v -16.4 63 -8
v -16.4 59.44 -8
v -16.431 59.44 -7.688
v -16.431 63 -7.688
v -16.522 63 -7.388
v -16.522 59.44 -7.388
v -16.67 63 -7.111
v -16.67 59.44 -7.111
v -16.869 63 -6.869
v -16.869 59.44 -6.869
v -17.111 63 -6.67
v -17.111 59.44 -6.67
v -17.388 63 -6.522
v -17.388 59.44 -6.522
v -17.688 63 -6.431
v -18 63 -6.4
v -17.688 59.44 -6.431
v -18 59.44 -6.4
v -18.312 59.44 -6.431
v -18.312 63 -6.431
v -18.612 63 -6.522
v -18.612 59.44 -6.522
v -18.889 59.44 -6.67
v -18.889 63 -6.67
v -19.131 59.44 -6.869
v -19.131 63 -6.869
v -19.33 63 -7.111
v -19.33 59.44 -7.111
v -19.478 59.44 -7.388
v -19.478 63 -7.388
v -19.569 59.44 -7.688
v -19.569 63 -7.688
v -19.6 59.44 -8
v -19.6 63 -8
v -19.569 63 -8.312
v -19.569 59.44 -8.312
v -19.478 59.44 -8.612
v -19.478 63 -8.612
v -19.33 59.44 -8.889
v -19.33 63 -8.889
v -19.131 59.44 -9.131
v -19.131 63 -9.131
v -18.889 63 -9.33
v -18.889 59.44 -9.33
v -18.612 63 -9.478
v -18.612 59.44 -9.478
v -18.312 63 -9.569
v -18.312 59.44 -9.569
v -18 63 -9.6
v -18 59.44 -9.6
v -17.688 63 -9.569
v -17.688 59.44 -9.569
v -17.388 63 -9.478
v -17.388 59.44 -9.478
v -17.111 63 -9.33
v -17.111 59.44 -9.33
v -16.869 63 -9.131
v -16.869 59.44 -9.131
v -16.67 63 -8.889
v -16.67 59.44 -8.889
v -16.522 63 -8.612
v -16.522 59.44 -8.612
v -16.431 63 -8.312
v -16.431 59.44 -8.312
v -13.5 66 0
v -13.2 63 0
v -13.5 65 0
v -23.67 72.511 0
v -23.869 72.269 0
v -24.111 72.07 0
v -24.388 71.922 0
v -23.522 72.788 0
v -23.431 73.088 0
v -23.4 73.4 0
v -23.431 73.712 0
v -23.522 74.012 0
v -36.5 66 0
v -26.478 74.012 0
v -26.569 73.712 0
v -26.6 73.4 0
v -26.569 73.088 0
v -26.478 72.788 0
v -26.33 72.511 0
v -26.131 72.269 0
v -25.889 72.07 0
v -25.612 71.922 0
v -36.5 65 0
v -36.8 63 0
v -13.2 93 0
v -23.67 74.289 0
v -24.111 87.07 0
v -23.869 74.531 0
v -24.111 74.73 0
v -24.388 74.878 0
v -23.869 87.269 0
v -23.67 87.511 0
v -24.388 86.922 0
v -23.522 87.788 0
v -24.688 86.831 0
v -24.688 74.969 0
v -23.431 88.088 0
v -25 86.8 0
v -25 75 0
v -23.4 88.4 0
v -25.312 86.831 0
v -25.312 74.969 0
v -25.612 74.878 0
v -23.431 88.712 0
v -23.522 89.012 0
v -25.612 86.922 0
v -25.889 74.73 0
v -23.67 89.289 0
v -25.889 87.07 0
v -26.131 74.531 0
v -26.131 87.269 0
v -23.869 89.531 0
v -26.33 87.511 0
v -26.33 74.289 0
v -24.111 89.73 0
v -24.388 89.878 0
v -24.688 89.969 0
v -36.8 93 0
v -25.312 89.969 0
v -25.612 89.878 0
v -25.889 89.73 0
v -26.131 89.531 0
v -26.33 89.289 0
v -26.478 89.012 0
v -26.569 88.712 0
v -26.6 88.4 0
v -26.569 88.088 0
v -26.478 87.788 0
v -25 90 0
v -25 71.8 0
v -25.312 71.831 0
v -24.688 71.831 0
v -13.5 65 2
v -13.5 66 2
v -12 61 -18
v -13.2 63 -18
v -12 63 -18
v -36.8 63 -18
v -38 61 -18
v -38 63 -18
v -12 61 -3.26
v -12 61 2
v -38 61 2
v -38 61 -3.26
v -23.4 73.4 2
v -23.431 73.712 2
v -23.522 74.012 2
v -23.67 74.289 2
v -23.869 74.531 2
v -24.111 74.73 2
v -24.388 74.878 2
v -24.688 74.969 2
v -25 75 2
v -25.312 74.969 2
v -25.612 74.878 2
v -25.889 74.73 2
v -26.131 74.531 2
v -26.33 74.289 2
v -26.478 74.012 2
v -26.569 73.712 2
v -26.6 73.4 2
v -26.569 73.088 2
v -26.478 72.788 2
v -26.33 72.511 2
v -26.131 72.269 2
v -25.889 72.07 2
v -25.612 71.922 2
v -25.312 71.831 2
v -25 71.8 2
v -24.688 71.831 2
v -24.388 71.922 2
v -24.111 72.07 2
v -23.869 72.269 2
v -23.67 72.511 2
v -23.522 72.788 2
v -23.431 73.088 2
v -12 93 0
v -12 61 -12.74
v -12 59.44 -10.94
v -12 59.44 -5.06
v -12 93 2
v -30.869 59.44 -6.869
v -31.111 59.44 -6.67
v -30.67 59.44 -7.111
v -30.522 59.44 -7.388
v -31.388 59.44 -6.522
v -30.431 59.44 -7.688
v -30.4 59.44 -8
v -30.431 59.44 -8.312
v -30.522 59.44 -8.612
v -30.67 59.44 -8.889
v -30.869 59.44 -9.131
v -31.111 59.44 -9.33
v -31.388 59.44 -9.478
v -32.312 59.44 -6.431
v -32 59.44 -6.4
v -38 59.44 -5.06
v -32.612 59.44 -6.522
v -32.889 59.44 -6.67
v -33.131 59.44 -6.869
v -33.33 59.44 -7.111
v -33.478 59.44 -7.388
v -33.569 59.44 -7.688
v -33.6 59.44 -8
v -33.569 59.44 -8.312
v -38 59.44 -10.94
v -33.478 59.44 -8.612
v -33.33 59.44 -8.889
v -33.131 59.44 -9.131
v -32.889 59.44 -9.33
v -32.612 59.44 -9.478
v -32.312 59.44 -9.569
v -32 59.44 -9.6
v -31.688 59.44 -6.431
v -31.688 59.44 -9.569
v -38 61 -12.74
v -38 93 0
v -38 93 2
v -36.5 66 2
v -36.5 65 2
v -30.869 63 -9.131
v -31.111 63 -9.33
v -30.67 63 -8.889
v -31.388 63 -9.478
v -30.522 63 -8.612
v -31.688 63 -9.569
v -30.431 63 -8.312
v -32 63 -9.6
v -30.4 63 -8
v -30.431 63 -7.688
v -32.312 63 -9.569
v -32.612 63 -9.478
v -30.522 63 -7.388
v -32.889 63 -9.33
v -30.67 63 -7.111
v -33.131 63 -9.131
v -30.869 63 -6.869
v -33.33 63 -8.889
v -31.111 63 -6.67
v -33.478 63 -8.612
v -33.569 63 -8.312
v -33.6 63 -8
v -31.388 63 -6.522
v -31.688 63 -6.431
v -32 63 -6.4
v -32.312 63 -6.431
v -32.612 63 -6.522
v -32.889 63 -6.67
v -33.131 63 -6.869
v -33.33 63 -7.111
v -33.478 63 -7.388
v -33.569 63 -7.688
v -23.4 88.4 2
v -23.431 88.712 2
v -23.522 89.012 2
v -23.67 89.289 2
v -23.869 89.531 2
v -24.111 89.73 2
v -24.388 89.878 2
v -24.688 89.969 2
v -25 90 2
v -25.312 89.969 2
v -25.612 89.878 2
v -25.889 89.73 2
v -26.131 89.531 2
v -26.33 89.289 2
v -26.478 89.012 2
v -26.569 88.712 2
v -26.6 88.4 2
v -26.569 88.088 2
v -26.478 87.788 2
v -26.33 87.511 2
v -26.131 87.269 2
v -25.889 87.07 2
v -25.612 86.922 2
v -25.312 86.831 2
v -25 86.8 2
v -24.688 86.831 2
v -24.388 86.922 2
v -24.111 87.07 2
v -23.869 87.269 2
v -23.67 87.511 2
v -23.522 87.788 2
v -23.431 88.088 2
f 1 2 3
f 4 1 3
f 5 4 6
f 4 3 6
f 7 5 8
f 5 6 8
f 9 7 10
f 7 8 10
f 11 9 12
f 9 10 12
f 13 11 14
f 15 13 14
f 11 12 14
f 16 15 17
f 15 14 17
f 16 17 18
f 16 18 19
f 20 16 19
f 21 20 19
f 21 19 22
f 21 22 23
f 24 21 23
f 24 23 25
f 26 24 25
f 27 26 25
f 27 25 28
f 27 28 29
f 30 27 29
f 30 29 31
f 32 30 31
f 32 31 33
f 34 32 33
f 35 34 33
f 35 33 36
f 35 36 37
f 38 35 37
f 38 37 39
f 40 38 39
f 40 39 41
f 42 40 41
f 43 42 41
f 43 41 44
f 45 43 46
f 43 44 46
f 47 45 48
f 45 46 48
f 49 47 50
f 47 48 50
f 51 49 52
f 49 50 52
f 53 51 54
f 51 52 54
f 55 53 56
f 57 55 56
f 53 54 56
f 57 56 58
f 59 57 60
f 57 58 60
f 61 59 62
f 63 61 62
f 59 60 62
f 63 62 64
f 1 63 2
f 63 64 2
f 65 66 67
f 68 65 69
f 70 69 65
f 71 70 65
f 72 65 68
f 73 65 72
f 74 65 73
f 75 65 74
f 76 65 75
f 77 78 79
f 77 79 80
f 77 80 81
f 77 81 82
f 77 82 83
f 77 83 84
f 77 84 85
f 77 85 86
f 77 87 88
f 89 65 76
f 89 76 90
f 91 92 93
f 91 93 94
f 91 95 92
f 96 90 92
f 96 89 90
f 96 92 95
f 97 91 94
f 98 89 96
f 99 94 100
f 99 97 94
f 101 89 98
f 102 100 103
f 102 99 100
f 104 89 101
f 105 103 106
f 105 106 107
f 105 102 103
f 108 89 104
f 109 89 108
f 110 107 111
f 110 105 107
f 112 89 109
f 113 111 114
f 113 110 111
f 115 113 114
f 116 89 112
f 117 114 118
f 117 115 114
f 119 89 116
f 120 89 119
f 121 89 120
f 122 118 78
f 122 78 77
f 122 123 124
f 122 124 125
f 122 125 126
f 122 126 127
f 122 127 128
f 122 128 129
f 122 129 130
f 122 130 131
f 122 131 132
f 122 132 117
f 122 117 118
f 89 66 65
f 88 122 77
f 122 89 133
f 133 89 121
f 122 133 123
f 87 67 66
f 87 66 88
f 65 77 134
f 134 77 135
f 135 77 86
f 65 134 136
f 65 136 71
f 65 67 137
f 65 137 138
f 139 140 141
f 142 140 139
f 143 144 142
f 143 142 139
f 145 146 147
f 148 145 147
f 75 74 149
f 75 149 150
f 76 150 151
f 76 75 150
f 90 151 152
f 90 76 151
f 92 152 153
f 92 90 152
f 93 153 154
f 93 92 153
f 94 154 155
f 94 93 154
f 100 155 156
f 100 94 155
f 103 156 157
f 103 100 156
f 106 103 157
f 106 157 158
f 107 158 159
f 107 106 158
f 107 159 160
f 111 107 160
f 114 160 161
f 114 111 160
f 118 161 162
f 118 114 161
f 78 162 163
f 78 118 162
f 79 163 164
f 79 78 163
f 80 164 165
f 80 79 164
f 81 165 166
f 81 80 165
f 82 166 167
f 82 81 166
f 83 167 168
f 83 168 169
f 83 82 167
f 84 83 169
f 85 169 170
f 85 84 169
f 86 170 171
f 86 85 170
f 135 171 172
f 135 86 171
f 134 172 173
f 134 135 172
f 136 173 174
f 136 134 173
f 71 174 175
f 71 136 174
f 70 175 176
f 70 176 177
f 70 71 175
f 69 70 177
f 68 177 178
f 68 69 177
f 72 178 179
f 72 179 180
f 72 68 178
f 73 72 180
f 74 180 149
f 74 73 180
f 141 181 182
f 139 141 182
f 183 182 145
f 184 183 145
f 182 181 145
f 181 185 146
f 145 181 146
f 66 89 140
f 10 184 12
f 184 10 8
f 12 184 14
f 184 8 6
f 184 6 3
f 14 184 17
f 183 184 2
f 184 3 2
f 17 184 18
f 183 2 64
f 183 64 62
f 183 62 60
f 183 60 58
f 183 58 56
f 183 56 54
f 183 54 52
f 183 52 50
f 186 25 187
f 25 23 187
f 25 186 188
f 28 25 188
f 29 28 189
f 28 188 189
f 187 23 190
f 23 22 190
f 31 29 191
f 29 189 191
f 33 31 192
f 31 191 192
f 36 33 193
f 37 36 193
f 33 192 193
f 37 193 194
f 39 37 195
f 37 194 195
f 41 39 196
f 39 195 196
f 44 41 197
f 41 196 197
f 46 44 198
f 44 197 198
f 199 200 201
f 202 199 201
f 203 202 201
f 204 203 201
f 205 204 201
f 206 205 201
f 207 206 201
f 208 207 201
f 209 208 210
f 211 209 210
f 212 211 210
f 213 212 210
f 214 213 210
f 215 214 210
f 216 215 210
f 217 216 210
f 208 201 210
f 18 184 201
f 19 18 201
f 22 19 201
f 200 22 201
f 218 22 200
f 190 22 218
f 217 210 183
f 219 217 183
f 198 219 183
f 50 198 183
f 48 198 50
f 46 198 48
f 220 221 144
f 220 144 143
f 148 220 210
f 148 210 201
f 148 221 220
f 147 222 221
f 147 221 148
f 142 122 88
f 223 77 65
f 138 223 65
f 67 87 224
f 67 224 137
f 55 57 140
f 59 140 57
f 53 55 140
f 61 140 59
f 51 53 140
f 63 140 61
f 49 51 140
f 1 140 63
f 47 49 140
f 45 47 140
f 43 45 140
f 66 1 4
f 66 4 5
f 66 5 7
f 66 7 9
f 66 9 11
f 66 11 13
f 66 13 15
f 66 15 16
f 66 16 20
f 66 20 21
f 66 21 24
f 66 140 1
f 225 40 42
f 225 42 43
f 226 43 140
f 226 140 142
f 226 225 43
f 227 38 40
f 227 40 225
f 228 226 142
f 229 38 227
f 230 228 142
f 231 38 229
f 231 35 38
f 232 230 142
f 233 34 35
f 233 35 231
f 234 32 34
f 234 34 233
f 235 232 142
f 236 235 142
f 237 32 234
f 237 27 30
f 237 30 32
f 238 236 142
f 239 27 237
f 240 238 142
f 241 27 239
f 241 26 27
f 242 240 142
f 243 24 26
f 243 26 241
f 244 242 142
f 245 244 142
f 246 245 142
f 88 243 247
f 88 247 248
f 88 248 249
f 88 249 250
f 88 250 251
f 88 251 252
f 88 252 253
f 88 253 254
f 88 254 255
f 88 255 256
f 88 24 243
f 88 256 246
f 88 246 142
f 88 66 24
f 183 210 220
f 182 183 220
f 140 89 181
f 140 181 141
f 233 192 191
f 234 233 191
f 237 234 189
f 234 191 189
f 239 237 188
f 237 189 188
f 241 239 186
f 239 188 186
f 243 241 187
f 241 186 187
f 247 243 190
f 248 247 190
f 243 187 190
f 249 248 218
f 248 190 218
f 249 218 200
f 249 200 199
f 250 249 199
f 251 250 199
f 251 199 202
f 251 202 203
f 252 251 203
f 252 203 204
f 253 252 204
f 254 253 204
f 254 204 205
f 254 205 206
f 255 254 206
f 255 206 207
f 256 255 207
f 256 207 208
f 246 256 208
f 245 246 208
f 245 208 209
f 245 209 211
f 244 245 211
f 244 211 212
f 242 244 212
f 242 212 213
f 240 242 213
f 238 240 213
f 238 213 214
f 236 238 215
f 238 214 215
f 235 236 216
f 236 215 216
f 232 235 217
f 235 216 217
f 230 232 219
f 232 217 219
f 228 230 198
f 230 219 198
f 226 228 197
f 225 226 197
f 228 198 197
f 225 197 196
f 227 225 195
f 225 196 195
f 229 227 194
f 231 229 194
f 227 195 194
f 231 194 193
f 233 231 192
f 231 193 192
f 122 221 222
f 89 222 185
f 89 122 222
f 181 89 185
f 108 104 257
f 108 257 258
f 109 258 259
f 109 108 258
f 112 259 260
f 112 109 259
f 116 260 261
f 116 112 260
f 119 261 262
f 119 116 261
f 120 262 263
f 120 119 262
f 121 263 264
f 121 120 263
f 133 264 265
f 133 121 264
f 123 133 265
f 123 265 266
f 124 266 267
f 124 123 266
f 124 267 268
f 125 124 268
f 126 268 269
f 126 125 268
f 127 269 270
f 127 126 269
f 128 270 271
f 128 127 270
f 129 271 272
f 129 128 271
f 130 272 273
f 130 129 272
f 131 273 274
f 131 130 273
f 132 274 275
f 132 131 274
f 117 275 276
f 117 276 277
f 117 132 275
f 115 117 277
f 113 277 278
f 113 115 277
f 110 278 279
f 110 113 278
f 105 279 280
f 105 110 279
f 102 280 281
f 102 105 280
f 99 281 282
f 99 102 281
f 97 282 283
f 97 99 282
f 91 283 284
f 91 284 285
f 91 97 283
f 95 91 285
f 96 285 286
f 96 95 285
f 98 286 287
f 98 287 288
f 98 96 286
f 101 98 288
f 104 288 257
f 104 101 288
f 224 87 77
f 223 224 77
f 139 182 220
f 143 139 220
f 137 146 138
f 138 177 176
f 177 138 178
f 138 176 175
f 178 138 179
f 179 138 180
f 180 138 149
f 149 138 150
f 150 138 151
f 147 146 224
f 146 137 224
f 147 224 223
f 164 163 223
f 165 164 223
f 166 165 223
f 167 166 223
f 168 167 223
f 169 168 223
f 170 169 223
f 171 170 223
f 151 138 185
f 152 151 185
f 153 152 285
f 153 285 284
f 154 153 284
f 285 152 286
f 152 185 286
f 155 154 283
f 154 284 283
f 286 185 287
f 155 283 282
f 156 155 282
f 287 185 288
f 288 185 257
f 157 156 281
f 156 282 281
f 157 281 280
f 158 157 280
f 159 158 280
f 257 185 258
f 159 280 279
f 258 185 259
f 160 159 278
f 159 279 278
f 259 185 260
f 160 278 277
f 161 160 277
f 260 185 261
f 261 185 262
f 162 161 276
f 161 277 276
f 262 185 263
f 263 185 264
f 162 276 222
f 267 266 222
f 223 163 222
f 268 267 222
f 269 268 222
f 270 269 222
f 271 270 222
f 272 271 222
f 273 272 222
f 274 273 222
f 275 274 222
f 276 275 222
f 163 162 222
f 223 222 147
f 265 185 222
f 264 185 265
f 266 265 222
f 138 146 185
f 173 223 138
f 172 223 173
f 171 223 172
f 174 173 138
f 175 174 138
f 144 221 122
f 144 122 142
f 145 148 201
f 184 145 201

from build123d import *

# Parameters (mm, degrees)
SKETCH010_W         = 26
SKETCH010_H         = 30
SKETCH010_R         = 1.6
SKETCH010_W_2       = 23
SKETCH010_H_2       = 1
PAD009_DEPTH        = 2
PAD009_FACE3_W      = 26
PAD009_FACE3_H      = 2
PAD010_DEPTH        = 2
PAD010_FACE8_W      = 2
PAD010_FACE8_H      = 26
PAD011_DEPTH        = 18
PAD012_DEPTH        = 26
SKETCH012_R         = 1.6
POCKET006_DEPTH     = 33.561
PAD013_DEPTH        = 1.2
LINEARPATTERN_COUNT = 2
LINEARPATTERN_PITCH = 24.8


with BuildPart() as part:
    # Sketch010 → Pad009 (new body)
    with BuildSketch(Plane.XY):
        Rectangle(SKETCH010_W, SKETCH010_H)
        with Locations((0, 10.4)):
            Circle(SKETCH010_R, mode=Mode.SUBTRACT)
        with Locations((0, -4.6)):
            Circle(SKETCH010_R, mode=Mode.SUBTRACT)
        with Locations((0, -12.5)):
            Rectangle(SKETCH010_W_2, SKETCH010_H_2, mode=Mode.SUBTRACT)
    extrude(amount=PAD009_DEPTH)

    # Pad009 Face3 → Pad010 (add)
    with BuildSketch(Plane(origin=(0, -15, 1), x_dir=(-1, 0, 0), z_dir=(0, -1, 0))):
        Rectangle(PAD009_FACE3_W, PAD009_FACE3_H)
    extrude(amount=PAD010_DEPTH)

    # Pad010 Face8 → Pad011 (add)
    with BuildSketch(Plane(origin=(0, -16, 0), x_dir=(0, -1, 0), z_dir=(0, 0, -1))):
        Rectangle(PAD010_FACE8_W, PAD010_FACE8_H)
    extrude(amount=PAD011_DEPTH)

    # Sketch011 (on Face16 of Pad011) → Pad012 (join)
    with BuildSketch(Plane(origin=(-13, 0, 0), x_dir=(0, -1, 0), z_dir=(-1, 0, 0))):
        Polygon((17, -8), (17, -3.26), (18.56, -5.06), (18.56, -10.94), (17, -12.74), align=None)
    extrude(amount=-PAD012_DEPTH)

    # Sketch012 (on Face25 of Pad012) → Pocket006 (cut, through all)
    with BuildSketch(Plane.XZ.offset(18.56)):
        with Locations((-7, -8)):
            Circle(SKETCH012_R)
        with Locations((7, -8)):
            Circle(SKETCH012_R)
    extrude(amount=-POCKET006_DEPTH, mode=Mode.SUBTRACT)

    # Sketch013 (on Face16 of Pocket006) → Pad013 (join)
    with BuildSketch(Plane(origin=(-13, 0, 0), x_dir=(0, -1, 0), z_dir=(-1, 0, 0))):
        Polygon((-15, 0), (15, -18), (15, 0), align=None)
    pad013 = extrude(amount=-PAD013_DEPTH)

    # LinearPattern: Pad013 ×2
    with Locations(*[(i * LINEARPATTERN_PITCH, 0, 0) for i in range(1, LINEARPATTERN_COUNT)]):
        add(pad013)


with BuildPart() as part_1:
    # Body002 placement: moved
    add(part.part.moved(Location((-25, 78, 0))))


solid = part_1.part
